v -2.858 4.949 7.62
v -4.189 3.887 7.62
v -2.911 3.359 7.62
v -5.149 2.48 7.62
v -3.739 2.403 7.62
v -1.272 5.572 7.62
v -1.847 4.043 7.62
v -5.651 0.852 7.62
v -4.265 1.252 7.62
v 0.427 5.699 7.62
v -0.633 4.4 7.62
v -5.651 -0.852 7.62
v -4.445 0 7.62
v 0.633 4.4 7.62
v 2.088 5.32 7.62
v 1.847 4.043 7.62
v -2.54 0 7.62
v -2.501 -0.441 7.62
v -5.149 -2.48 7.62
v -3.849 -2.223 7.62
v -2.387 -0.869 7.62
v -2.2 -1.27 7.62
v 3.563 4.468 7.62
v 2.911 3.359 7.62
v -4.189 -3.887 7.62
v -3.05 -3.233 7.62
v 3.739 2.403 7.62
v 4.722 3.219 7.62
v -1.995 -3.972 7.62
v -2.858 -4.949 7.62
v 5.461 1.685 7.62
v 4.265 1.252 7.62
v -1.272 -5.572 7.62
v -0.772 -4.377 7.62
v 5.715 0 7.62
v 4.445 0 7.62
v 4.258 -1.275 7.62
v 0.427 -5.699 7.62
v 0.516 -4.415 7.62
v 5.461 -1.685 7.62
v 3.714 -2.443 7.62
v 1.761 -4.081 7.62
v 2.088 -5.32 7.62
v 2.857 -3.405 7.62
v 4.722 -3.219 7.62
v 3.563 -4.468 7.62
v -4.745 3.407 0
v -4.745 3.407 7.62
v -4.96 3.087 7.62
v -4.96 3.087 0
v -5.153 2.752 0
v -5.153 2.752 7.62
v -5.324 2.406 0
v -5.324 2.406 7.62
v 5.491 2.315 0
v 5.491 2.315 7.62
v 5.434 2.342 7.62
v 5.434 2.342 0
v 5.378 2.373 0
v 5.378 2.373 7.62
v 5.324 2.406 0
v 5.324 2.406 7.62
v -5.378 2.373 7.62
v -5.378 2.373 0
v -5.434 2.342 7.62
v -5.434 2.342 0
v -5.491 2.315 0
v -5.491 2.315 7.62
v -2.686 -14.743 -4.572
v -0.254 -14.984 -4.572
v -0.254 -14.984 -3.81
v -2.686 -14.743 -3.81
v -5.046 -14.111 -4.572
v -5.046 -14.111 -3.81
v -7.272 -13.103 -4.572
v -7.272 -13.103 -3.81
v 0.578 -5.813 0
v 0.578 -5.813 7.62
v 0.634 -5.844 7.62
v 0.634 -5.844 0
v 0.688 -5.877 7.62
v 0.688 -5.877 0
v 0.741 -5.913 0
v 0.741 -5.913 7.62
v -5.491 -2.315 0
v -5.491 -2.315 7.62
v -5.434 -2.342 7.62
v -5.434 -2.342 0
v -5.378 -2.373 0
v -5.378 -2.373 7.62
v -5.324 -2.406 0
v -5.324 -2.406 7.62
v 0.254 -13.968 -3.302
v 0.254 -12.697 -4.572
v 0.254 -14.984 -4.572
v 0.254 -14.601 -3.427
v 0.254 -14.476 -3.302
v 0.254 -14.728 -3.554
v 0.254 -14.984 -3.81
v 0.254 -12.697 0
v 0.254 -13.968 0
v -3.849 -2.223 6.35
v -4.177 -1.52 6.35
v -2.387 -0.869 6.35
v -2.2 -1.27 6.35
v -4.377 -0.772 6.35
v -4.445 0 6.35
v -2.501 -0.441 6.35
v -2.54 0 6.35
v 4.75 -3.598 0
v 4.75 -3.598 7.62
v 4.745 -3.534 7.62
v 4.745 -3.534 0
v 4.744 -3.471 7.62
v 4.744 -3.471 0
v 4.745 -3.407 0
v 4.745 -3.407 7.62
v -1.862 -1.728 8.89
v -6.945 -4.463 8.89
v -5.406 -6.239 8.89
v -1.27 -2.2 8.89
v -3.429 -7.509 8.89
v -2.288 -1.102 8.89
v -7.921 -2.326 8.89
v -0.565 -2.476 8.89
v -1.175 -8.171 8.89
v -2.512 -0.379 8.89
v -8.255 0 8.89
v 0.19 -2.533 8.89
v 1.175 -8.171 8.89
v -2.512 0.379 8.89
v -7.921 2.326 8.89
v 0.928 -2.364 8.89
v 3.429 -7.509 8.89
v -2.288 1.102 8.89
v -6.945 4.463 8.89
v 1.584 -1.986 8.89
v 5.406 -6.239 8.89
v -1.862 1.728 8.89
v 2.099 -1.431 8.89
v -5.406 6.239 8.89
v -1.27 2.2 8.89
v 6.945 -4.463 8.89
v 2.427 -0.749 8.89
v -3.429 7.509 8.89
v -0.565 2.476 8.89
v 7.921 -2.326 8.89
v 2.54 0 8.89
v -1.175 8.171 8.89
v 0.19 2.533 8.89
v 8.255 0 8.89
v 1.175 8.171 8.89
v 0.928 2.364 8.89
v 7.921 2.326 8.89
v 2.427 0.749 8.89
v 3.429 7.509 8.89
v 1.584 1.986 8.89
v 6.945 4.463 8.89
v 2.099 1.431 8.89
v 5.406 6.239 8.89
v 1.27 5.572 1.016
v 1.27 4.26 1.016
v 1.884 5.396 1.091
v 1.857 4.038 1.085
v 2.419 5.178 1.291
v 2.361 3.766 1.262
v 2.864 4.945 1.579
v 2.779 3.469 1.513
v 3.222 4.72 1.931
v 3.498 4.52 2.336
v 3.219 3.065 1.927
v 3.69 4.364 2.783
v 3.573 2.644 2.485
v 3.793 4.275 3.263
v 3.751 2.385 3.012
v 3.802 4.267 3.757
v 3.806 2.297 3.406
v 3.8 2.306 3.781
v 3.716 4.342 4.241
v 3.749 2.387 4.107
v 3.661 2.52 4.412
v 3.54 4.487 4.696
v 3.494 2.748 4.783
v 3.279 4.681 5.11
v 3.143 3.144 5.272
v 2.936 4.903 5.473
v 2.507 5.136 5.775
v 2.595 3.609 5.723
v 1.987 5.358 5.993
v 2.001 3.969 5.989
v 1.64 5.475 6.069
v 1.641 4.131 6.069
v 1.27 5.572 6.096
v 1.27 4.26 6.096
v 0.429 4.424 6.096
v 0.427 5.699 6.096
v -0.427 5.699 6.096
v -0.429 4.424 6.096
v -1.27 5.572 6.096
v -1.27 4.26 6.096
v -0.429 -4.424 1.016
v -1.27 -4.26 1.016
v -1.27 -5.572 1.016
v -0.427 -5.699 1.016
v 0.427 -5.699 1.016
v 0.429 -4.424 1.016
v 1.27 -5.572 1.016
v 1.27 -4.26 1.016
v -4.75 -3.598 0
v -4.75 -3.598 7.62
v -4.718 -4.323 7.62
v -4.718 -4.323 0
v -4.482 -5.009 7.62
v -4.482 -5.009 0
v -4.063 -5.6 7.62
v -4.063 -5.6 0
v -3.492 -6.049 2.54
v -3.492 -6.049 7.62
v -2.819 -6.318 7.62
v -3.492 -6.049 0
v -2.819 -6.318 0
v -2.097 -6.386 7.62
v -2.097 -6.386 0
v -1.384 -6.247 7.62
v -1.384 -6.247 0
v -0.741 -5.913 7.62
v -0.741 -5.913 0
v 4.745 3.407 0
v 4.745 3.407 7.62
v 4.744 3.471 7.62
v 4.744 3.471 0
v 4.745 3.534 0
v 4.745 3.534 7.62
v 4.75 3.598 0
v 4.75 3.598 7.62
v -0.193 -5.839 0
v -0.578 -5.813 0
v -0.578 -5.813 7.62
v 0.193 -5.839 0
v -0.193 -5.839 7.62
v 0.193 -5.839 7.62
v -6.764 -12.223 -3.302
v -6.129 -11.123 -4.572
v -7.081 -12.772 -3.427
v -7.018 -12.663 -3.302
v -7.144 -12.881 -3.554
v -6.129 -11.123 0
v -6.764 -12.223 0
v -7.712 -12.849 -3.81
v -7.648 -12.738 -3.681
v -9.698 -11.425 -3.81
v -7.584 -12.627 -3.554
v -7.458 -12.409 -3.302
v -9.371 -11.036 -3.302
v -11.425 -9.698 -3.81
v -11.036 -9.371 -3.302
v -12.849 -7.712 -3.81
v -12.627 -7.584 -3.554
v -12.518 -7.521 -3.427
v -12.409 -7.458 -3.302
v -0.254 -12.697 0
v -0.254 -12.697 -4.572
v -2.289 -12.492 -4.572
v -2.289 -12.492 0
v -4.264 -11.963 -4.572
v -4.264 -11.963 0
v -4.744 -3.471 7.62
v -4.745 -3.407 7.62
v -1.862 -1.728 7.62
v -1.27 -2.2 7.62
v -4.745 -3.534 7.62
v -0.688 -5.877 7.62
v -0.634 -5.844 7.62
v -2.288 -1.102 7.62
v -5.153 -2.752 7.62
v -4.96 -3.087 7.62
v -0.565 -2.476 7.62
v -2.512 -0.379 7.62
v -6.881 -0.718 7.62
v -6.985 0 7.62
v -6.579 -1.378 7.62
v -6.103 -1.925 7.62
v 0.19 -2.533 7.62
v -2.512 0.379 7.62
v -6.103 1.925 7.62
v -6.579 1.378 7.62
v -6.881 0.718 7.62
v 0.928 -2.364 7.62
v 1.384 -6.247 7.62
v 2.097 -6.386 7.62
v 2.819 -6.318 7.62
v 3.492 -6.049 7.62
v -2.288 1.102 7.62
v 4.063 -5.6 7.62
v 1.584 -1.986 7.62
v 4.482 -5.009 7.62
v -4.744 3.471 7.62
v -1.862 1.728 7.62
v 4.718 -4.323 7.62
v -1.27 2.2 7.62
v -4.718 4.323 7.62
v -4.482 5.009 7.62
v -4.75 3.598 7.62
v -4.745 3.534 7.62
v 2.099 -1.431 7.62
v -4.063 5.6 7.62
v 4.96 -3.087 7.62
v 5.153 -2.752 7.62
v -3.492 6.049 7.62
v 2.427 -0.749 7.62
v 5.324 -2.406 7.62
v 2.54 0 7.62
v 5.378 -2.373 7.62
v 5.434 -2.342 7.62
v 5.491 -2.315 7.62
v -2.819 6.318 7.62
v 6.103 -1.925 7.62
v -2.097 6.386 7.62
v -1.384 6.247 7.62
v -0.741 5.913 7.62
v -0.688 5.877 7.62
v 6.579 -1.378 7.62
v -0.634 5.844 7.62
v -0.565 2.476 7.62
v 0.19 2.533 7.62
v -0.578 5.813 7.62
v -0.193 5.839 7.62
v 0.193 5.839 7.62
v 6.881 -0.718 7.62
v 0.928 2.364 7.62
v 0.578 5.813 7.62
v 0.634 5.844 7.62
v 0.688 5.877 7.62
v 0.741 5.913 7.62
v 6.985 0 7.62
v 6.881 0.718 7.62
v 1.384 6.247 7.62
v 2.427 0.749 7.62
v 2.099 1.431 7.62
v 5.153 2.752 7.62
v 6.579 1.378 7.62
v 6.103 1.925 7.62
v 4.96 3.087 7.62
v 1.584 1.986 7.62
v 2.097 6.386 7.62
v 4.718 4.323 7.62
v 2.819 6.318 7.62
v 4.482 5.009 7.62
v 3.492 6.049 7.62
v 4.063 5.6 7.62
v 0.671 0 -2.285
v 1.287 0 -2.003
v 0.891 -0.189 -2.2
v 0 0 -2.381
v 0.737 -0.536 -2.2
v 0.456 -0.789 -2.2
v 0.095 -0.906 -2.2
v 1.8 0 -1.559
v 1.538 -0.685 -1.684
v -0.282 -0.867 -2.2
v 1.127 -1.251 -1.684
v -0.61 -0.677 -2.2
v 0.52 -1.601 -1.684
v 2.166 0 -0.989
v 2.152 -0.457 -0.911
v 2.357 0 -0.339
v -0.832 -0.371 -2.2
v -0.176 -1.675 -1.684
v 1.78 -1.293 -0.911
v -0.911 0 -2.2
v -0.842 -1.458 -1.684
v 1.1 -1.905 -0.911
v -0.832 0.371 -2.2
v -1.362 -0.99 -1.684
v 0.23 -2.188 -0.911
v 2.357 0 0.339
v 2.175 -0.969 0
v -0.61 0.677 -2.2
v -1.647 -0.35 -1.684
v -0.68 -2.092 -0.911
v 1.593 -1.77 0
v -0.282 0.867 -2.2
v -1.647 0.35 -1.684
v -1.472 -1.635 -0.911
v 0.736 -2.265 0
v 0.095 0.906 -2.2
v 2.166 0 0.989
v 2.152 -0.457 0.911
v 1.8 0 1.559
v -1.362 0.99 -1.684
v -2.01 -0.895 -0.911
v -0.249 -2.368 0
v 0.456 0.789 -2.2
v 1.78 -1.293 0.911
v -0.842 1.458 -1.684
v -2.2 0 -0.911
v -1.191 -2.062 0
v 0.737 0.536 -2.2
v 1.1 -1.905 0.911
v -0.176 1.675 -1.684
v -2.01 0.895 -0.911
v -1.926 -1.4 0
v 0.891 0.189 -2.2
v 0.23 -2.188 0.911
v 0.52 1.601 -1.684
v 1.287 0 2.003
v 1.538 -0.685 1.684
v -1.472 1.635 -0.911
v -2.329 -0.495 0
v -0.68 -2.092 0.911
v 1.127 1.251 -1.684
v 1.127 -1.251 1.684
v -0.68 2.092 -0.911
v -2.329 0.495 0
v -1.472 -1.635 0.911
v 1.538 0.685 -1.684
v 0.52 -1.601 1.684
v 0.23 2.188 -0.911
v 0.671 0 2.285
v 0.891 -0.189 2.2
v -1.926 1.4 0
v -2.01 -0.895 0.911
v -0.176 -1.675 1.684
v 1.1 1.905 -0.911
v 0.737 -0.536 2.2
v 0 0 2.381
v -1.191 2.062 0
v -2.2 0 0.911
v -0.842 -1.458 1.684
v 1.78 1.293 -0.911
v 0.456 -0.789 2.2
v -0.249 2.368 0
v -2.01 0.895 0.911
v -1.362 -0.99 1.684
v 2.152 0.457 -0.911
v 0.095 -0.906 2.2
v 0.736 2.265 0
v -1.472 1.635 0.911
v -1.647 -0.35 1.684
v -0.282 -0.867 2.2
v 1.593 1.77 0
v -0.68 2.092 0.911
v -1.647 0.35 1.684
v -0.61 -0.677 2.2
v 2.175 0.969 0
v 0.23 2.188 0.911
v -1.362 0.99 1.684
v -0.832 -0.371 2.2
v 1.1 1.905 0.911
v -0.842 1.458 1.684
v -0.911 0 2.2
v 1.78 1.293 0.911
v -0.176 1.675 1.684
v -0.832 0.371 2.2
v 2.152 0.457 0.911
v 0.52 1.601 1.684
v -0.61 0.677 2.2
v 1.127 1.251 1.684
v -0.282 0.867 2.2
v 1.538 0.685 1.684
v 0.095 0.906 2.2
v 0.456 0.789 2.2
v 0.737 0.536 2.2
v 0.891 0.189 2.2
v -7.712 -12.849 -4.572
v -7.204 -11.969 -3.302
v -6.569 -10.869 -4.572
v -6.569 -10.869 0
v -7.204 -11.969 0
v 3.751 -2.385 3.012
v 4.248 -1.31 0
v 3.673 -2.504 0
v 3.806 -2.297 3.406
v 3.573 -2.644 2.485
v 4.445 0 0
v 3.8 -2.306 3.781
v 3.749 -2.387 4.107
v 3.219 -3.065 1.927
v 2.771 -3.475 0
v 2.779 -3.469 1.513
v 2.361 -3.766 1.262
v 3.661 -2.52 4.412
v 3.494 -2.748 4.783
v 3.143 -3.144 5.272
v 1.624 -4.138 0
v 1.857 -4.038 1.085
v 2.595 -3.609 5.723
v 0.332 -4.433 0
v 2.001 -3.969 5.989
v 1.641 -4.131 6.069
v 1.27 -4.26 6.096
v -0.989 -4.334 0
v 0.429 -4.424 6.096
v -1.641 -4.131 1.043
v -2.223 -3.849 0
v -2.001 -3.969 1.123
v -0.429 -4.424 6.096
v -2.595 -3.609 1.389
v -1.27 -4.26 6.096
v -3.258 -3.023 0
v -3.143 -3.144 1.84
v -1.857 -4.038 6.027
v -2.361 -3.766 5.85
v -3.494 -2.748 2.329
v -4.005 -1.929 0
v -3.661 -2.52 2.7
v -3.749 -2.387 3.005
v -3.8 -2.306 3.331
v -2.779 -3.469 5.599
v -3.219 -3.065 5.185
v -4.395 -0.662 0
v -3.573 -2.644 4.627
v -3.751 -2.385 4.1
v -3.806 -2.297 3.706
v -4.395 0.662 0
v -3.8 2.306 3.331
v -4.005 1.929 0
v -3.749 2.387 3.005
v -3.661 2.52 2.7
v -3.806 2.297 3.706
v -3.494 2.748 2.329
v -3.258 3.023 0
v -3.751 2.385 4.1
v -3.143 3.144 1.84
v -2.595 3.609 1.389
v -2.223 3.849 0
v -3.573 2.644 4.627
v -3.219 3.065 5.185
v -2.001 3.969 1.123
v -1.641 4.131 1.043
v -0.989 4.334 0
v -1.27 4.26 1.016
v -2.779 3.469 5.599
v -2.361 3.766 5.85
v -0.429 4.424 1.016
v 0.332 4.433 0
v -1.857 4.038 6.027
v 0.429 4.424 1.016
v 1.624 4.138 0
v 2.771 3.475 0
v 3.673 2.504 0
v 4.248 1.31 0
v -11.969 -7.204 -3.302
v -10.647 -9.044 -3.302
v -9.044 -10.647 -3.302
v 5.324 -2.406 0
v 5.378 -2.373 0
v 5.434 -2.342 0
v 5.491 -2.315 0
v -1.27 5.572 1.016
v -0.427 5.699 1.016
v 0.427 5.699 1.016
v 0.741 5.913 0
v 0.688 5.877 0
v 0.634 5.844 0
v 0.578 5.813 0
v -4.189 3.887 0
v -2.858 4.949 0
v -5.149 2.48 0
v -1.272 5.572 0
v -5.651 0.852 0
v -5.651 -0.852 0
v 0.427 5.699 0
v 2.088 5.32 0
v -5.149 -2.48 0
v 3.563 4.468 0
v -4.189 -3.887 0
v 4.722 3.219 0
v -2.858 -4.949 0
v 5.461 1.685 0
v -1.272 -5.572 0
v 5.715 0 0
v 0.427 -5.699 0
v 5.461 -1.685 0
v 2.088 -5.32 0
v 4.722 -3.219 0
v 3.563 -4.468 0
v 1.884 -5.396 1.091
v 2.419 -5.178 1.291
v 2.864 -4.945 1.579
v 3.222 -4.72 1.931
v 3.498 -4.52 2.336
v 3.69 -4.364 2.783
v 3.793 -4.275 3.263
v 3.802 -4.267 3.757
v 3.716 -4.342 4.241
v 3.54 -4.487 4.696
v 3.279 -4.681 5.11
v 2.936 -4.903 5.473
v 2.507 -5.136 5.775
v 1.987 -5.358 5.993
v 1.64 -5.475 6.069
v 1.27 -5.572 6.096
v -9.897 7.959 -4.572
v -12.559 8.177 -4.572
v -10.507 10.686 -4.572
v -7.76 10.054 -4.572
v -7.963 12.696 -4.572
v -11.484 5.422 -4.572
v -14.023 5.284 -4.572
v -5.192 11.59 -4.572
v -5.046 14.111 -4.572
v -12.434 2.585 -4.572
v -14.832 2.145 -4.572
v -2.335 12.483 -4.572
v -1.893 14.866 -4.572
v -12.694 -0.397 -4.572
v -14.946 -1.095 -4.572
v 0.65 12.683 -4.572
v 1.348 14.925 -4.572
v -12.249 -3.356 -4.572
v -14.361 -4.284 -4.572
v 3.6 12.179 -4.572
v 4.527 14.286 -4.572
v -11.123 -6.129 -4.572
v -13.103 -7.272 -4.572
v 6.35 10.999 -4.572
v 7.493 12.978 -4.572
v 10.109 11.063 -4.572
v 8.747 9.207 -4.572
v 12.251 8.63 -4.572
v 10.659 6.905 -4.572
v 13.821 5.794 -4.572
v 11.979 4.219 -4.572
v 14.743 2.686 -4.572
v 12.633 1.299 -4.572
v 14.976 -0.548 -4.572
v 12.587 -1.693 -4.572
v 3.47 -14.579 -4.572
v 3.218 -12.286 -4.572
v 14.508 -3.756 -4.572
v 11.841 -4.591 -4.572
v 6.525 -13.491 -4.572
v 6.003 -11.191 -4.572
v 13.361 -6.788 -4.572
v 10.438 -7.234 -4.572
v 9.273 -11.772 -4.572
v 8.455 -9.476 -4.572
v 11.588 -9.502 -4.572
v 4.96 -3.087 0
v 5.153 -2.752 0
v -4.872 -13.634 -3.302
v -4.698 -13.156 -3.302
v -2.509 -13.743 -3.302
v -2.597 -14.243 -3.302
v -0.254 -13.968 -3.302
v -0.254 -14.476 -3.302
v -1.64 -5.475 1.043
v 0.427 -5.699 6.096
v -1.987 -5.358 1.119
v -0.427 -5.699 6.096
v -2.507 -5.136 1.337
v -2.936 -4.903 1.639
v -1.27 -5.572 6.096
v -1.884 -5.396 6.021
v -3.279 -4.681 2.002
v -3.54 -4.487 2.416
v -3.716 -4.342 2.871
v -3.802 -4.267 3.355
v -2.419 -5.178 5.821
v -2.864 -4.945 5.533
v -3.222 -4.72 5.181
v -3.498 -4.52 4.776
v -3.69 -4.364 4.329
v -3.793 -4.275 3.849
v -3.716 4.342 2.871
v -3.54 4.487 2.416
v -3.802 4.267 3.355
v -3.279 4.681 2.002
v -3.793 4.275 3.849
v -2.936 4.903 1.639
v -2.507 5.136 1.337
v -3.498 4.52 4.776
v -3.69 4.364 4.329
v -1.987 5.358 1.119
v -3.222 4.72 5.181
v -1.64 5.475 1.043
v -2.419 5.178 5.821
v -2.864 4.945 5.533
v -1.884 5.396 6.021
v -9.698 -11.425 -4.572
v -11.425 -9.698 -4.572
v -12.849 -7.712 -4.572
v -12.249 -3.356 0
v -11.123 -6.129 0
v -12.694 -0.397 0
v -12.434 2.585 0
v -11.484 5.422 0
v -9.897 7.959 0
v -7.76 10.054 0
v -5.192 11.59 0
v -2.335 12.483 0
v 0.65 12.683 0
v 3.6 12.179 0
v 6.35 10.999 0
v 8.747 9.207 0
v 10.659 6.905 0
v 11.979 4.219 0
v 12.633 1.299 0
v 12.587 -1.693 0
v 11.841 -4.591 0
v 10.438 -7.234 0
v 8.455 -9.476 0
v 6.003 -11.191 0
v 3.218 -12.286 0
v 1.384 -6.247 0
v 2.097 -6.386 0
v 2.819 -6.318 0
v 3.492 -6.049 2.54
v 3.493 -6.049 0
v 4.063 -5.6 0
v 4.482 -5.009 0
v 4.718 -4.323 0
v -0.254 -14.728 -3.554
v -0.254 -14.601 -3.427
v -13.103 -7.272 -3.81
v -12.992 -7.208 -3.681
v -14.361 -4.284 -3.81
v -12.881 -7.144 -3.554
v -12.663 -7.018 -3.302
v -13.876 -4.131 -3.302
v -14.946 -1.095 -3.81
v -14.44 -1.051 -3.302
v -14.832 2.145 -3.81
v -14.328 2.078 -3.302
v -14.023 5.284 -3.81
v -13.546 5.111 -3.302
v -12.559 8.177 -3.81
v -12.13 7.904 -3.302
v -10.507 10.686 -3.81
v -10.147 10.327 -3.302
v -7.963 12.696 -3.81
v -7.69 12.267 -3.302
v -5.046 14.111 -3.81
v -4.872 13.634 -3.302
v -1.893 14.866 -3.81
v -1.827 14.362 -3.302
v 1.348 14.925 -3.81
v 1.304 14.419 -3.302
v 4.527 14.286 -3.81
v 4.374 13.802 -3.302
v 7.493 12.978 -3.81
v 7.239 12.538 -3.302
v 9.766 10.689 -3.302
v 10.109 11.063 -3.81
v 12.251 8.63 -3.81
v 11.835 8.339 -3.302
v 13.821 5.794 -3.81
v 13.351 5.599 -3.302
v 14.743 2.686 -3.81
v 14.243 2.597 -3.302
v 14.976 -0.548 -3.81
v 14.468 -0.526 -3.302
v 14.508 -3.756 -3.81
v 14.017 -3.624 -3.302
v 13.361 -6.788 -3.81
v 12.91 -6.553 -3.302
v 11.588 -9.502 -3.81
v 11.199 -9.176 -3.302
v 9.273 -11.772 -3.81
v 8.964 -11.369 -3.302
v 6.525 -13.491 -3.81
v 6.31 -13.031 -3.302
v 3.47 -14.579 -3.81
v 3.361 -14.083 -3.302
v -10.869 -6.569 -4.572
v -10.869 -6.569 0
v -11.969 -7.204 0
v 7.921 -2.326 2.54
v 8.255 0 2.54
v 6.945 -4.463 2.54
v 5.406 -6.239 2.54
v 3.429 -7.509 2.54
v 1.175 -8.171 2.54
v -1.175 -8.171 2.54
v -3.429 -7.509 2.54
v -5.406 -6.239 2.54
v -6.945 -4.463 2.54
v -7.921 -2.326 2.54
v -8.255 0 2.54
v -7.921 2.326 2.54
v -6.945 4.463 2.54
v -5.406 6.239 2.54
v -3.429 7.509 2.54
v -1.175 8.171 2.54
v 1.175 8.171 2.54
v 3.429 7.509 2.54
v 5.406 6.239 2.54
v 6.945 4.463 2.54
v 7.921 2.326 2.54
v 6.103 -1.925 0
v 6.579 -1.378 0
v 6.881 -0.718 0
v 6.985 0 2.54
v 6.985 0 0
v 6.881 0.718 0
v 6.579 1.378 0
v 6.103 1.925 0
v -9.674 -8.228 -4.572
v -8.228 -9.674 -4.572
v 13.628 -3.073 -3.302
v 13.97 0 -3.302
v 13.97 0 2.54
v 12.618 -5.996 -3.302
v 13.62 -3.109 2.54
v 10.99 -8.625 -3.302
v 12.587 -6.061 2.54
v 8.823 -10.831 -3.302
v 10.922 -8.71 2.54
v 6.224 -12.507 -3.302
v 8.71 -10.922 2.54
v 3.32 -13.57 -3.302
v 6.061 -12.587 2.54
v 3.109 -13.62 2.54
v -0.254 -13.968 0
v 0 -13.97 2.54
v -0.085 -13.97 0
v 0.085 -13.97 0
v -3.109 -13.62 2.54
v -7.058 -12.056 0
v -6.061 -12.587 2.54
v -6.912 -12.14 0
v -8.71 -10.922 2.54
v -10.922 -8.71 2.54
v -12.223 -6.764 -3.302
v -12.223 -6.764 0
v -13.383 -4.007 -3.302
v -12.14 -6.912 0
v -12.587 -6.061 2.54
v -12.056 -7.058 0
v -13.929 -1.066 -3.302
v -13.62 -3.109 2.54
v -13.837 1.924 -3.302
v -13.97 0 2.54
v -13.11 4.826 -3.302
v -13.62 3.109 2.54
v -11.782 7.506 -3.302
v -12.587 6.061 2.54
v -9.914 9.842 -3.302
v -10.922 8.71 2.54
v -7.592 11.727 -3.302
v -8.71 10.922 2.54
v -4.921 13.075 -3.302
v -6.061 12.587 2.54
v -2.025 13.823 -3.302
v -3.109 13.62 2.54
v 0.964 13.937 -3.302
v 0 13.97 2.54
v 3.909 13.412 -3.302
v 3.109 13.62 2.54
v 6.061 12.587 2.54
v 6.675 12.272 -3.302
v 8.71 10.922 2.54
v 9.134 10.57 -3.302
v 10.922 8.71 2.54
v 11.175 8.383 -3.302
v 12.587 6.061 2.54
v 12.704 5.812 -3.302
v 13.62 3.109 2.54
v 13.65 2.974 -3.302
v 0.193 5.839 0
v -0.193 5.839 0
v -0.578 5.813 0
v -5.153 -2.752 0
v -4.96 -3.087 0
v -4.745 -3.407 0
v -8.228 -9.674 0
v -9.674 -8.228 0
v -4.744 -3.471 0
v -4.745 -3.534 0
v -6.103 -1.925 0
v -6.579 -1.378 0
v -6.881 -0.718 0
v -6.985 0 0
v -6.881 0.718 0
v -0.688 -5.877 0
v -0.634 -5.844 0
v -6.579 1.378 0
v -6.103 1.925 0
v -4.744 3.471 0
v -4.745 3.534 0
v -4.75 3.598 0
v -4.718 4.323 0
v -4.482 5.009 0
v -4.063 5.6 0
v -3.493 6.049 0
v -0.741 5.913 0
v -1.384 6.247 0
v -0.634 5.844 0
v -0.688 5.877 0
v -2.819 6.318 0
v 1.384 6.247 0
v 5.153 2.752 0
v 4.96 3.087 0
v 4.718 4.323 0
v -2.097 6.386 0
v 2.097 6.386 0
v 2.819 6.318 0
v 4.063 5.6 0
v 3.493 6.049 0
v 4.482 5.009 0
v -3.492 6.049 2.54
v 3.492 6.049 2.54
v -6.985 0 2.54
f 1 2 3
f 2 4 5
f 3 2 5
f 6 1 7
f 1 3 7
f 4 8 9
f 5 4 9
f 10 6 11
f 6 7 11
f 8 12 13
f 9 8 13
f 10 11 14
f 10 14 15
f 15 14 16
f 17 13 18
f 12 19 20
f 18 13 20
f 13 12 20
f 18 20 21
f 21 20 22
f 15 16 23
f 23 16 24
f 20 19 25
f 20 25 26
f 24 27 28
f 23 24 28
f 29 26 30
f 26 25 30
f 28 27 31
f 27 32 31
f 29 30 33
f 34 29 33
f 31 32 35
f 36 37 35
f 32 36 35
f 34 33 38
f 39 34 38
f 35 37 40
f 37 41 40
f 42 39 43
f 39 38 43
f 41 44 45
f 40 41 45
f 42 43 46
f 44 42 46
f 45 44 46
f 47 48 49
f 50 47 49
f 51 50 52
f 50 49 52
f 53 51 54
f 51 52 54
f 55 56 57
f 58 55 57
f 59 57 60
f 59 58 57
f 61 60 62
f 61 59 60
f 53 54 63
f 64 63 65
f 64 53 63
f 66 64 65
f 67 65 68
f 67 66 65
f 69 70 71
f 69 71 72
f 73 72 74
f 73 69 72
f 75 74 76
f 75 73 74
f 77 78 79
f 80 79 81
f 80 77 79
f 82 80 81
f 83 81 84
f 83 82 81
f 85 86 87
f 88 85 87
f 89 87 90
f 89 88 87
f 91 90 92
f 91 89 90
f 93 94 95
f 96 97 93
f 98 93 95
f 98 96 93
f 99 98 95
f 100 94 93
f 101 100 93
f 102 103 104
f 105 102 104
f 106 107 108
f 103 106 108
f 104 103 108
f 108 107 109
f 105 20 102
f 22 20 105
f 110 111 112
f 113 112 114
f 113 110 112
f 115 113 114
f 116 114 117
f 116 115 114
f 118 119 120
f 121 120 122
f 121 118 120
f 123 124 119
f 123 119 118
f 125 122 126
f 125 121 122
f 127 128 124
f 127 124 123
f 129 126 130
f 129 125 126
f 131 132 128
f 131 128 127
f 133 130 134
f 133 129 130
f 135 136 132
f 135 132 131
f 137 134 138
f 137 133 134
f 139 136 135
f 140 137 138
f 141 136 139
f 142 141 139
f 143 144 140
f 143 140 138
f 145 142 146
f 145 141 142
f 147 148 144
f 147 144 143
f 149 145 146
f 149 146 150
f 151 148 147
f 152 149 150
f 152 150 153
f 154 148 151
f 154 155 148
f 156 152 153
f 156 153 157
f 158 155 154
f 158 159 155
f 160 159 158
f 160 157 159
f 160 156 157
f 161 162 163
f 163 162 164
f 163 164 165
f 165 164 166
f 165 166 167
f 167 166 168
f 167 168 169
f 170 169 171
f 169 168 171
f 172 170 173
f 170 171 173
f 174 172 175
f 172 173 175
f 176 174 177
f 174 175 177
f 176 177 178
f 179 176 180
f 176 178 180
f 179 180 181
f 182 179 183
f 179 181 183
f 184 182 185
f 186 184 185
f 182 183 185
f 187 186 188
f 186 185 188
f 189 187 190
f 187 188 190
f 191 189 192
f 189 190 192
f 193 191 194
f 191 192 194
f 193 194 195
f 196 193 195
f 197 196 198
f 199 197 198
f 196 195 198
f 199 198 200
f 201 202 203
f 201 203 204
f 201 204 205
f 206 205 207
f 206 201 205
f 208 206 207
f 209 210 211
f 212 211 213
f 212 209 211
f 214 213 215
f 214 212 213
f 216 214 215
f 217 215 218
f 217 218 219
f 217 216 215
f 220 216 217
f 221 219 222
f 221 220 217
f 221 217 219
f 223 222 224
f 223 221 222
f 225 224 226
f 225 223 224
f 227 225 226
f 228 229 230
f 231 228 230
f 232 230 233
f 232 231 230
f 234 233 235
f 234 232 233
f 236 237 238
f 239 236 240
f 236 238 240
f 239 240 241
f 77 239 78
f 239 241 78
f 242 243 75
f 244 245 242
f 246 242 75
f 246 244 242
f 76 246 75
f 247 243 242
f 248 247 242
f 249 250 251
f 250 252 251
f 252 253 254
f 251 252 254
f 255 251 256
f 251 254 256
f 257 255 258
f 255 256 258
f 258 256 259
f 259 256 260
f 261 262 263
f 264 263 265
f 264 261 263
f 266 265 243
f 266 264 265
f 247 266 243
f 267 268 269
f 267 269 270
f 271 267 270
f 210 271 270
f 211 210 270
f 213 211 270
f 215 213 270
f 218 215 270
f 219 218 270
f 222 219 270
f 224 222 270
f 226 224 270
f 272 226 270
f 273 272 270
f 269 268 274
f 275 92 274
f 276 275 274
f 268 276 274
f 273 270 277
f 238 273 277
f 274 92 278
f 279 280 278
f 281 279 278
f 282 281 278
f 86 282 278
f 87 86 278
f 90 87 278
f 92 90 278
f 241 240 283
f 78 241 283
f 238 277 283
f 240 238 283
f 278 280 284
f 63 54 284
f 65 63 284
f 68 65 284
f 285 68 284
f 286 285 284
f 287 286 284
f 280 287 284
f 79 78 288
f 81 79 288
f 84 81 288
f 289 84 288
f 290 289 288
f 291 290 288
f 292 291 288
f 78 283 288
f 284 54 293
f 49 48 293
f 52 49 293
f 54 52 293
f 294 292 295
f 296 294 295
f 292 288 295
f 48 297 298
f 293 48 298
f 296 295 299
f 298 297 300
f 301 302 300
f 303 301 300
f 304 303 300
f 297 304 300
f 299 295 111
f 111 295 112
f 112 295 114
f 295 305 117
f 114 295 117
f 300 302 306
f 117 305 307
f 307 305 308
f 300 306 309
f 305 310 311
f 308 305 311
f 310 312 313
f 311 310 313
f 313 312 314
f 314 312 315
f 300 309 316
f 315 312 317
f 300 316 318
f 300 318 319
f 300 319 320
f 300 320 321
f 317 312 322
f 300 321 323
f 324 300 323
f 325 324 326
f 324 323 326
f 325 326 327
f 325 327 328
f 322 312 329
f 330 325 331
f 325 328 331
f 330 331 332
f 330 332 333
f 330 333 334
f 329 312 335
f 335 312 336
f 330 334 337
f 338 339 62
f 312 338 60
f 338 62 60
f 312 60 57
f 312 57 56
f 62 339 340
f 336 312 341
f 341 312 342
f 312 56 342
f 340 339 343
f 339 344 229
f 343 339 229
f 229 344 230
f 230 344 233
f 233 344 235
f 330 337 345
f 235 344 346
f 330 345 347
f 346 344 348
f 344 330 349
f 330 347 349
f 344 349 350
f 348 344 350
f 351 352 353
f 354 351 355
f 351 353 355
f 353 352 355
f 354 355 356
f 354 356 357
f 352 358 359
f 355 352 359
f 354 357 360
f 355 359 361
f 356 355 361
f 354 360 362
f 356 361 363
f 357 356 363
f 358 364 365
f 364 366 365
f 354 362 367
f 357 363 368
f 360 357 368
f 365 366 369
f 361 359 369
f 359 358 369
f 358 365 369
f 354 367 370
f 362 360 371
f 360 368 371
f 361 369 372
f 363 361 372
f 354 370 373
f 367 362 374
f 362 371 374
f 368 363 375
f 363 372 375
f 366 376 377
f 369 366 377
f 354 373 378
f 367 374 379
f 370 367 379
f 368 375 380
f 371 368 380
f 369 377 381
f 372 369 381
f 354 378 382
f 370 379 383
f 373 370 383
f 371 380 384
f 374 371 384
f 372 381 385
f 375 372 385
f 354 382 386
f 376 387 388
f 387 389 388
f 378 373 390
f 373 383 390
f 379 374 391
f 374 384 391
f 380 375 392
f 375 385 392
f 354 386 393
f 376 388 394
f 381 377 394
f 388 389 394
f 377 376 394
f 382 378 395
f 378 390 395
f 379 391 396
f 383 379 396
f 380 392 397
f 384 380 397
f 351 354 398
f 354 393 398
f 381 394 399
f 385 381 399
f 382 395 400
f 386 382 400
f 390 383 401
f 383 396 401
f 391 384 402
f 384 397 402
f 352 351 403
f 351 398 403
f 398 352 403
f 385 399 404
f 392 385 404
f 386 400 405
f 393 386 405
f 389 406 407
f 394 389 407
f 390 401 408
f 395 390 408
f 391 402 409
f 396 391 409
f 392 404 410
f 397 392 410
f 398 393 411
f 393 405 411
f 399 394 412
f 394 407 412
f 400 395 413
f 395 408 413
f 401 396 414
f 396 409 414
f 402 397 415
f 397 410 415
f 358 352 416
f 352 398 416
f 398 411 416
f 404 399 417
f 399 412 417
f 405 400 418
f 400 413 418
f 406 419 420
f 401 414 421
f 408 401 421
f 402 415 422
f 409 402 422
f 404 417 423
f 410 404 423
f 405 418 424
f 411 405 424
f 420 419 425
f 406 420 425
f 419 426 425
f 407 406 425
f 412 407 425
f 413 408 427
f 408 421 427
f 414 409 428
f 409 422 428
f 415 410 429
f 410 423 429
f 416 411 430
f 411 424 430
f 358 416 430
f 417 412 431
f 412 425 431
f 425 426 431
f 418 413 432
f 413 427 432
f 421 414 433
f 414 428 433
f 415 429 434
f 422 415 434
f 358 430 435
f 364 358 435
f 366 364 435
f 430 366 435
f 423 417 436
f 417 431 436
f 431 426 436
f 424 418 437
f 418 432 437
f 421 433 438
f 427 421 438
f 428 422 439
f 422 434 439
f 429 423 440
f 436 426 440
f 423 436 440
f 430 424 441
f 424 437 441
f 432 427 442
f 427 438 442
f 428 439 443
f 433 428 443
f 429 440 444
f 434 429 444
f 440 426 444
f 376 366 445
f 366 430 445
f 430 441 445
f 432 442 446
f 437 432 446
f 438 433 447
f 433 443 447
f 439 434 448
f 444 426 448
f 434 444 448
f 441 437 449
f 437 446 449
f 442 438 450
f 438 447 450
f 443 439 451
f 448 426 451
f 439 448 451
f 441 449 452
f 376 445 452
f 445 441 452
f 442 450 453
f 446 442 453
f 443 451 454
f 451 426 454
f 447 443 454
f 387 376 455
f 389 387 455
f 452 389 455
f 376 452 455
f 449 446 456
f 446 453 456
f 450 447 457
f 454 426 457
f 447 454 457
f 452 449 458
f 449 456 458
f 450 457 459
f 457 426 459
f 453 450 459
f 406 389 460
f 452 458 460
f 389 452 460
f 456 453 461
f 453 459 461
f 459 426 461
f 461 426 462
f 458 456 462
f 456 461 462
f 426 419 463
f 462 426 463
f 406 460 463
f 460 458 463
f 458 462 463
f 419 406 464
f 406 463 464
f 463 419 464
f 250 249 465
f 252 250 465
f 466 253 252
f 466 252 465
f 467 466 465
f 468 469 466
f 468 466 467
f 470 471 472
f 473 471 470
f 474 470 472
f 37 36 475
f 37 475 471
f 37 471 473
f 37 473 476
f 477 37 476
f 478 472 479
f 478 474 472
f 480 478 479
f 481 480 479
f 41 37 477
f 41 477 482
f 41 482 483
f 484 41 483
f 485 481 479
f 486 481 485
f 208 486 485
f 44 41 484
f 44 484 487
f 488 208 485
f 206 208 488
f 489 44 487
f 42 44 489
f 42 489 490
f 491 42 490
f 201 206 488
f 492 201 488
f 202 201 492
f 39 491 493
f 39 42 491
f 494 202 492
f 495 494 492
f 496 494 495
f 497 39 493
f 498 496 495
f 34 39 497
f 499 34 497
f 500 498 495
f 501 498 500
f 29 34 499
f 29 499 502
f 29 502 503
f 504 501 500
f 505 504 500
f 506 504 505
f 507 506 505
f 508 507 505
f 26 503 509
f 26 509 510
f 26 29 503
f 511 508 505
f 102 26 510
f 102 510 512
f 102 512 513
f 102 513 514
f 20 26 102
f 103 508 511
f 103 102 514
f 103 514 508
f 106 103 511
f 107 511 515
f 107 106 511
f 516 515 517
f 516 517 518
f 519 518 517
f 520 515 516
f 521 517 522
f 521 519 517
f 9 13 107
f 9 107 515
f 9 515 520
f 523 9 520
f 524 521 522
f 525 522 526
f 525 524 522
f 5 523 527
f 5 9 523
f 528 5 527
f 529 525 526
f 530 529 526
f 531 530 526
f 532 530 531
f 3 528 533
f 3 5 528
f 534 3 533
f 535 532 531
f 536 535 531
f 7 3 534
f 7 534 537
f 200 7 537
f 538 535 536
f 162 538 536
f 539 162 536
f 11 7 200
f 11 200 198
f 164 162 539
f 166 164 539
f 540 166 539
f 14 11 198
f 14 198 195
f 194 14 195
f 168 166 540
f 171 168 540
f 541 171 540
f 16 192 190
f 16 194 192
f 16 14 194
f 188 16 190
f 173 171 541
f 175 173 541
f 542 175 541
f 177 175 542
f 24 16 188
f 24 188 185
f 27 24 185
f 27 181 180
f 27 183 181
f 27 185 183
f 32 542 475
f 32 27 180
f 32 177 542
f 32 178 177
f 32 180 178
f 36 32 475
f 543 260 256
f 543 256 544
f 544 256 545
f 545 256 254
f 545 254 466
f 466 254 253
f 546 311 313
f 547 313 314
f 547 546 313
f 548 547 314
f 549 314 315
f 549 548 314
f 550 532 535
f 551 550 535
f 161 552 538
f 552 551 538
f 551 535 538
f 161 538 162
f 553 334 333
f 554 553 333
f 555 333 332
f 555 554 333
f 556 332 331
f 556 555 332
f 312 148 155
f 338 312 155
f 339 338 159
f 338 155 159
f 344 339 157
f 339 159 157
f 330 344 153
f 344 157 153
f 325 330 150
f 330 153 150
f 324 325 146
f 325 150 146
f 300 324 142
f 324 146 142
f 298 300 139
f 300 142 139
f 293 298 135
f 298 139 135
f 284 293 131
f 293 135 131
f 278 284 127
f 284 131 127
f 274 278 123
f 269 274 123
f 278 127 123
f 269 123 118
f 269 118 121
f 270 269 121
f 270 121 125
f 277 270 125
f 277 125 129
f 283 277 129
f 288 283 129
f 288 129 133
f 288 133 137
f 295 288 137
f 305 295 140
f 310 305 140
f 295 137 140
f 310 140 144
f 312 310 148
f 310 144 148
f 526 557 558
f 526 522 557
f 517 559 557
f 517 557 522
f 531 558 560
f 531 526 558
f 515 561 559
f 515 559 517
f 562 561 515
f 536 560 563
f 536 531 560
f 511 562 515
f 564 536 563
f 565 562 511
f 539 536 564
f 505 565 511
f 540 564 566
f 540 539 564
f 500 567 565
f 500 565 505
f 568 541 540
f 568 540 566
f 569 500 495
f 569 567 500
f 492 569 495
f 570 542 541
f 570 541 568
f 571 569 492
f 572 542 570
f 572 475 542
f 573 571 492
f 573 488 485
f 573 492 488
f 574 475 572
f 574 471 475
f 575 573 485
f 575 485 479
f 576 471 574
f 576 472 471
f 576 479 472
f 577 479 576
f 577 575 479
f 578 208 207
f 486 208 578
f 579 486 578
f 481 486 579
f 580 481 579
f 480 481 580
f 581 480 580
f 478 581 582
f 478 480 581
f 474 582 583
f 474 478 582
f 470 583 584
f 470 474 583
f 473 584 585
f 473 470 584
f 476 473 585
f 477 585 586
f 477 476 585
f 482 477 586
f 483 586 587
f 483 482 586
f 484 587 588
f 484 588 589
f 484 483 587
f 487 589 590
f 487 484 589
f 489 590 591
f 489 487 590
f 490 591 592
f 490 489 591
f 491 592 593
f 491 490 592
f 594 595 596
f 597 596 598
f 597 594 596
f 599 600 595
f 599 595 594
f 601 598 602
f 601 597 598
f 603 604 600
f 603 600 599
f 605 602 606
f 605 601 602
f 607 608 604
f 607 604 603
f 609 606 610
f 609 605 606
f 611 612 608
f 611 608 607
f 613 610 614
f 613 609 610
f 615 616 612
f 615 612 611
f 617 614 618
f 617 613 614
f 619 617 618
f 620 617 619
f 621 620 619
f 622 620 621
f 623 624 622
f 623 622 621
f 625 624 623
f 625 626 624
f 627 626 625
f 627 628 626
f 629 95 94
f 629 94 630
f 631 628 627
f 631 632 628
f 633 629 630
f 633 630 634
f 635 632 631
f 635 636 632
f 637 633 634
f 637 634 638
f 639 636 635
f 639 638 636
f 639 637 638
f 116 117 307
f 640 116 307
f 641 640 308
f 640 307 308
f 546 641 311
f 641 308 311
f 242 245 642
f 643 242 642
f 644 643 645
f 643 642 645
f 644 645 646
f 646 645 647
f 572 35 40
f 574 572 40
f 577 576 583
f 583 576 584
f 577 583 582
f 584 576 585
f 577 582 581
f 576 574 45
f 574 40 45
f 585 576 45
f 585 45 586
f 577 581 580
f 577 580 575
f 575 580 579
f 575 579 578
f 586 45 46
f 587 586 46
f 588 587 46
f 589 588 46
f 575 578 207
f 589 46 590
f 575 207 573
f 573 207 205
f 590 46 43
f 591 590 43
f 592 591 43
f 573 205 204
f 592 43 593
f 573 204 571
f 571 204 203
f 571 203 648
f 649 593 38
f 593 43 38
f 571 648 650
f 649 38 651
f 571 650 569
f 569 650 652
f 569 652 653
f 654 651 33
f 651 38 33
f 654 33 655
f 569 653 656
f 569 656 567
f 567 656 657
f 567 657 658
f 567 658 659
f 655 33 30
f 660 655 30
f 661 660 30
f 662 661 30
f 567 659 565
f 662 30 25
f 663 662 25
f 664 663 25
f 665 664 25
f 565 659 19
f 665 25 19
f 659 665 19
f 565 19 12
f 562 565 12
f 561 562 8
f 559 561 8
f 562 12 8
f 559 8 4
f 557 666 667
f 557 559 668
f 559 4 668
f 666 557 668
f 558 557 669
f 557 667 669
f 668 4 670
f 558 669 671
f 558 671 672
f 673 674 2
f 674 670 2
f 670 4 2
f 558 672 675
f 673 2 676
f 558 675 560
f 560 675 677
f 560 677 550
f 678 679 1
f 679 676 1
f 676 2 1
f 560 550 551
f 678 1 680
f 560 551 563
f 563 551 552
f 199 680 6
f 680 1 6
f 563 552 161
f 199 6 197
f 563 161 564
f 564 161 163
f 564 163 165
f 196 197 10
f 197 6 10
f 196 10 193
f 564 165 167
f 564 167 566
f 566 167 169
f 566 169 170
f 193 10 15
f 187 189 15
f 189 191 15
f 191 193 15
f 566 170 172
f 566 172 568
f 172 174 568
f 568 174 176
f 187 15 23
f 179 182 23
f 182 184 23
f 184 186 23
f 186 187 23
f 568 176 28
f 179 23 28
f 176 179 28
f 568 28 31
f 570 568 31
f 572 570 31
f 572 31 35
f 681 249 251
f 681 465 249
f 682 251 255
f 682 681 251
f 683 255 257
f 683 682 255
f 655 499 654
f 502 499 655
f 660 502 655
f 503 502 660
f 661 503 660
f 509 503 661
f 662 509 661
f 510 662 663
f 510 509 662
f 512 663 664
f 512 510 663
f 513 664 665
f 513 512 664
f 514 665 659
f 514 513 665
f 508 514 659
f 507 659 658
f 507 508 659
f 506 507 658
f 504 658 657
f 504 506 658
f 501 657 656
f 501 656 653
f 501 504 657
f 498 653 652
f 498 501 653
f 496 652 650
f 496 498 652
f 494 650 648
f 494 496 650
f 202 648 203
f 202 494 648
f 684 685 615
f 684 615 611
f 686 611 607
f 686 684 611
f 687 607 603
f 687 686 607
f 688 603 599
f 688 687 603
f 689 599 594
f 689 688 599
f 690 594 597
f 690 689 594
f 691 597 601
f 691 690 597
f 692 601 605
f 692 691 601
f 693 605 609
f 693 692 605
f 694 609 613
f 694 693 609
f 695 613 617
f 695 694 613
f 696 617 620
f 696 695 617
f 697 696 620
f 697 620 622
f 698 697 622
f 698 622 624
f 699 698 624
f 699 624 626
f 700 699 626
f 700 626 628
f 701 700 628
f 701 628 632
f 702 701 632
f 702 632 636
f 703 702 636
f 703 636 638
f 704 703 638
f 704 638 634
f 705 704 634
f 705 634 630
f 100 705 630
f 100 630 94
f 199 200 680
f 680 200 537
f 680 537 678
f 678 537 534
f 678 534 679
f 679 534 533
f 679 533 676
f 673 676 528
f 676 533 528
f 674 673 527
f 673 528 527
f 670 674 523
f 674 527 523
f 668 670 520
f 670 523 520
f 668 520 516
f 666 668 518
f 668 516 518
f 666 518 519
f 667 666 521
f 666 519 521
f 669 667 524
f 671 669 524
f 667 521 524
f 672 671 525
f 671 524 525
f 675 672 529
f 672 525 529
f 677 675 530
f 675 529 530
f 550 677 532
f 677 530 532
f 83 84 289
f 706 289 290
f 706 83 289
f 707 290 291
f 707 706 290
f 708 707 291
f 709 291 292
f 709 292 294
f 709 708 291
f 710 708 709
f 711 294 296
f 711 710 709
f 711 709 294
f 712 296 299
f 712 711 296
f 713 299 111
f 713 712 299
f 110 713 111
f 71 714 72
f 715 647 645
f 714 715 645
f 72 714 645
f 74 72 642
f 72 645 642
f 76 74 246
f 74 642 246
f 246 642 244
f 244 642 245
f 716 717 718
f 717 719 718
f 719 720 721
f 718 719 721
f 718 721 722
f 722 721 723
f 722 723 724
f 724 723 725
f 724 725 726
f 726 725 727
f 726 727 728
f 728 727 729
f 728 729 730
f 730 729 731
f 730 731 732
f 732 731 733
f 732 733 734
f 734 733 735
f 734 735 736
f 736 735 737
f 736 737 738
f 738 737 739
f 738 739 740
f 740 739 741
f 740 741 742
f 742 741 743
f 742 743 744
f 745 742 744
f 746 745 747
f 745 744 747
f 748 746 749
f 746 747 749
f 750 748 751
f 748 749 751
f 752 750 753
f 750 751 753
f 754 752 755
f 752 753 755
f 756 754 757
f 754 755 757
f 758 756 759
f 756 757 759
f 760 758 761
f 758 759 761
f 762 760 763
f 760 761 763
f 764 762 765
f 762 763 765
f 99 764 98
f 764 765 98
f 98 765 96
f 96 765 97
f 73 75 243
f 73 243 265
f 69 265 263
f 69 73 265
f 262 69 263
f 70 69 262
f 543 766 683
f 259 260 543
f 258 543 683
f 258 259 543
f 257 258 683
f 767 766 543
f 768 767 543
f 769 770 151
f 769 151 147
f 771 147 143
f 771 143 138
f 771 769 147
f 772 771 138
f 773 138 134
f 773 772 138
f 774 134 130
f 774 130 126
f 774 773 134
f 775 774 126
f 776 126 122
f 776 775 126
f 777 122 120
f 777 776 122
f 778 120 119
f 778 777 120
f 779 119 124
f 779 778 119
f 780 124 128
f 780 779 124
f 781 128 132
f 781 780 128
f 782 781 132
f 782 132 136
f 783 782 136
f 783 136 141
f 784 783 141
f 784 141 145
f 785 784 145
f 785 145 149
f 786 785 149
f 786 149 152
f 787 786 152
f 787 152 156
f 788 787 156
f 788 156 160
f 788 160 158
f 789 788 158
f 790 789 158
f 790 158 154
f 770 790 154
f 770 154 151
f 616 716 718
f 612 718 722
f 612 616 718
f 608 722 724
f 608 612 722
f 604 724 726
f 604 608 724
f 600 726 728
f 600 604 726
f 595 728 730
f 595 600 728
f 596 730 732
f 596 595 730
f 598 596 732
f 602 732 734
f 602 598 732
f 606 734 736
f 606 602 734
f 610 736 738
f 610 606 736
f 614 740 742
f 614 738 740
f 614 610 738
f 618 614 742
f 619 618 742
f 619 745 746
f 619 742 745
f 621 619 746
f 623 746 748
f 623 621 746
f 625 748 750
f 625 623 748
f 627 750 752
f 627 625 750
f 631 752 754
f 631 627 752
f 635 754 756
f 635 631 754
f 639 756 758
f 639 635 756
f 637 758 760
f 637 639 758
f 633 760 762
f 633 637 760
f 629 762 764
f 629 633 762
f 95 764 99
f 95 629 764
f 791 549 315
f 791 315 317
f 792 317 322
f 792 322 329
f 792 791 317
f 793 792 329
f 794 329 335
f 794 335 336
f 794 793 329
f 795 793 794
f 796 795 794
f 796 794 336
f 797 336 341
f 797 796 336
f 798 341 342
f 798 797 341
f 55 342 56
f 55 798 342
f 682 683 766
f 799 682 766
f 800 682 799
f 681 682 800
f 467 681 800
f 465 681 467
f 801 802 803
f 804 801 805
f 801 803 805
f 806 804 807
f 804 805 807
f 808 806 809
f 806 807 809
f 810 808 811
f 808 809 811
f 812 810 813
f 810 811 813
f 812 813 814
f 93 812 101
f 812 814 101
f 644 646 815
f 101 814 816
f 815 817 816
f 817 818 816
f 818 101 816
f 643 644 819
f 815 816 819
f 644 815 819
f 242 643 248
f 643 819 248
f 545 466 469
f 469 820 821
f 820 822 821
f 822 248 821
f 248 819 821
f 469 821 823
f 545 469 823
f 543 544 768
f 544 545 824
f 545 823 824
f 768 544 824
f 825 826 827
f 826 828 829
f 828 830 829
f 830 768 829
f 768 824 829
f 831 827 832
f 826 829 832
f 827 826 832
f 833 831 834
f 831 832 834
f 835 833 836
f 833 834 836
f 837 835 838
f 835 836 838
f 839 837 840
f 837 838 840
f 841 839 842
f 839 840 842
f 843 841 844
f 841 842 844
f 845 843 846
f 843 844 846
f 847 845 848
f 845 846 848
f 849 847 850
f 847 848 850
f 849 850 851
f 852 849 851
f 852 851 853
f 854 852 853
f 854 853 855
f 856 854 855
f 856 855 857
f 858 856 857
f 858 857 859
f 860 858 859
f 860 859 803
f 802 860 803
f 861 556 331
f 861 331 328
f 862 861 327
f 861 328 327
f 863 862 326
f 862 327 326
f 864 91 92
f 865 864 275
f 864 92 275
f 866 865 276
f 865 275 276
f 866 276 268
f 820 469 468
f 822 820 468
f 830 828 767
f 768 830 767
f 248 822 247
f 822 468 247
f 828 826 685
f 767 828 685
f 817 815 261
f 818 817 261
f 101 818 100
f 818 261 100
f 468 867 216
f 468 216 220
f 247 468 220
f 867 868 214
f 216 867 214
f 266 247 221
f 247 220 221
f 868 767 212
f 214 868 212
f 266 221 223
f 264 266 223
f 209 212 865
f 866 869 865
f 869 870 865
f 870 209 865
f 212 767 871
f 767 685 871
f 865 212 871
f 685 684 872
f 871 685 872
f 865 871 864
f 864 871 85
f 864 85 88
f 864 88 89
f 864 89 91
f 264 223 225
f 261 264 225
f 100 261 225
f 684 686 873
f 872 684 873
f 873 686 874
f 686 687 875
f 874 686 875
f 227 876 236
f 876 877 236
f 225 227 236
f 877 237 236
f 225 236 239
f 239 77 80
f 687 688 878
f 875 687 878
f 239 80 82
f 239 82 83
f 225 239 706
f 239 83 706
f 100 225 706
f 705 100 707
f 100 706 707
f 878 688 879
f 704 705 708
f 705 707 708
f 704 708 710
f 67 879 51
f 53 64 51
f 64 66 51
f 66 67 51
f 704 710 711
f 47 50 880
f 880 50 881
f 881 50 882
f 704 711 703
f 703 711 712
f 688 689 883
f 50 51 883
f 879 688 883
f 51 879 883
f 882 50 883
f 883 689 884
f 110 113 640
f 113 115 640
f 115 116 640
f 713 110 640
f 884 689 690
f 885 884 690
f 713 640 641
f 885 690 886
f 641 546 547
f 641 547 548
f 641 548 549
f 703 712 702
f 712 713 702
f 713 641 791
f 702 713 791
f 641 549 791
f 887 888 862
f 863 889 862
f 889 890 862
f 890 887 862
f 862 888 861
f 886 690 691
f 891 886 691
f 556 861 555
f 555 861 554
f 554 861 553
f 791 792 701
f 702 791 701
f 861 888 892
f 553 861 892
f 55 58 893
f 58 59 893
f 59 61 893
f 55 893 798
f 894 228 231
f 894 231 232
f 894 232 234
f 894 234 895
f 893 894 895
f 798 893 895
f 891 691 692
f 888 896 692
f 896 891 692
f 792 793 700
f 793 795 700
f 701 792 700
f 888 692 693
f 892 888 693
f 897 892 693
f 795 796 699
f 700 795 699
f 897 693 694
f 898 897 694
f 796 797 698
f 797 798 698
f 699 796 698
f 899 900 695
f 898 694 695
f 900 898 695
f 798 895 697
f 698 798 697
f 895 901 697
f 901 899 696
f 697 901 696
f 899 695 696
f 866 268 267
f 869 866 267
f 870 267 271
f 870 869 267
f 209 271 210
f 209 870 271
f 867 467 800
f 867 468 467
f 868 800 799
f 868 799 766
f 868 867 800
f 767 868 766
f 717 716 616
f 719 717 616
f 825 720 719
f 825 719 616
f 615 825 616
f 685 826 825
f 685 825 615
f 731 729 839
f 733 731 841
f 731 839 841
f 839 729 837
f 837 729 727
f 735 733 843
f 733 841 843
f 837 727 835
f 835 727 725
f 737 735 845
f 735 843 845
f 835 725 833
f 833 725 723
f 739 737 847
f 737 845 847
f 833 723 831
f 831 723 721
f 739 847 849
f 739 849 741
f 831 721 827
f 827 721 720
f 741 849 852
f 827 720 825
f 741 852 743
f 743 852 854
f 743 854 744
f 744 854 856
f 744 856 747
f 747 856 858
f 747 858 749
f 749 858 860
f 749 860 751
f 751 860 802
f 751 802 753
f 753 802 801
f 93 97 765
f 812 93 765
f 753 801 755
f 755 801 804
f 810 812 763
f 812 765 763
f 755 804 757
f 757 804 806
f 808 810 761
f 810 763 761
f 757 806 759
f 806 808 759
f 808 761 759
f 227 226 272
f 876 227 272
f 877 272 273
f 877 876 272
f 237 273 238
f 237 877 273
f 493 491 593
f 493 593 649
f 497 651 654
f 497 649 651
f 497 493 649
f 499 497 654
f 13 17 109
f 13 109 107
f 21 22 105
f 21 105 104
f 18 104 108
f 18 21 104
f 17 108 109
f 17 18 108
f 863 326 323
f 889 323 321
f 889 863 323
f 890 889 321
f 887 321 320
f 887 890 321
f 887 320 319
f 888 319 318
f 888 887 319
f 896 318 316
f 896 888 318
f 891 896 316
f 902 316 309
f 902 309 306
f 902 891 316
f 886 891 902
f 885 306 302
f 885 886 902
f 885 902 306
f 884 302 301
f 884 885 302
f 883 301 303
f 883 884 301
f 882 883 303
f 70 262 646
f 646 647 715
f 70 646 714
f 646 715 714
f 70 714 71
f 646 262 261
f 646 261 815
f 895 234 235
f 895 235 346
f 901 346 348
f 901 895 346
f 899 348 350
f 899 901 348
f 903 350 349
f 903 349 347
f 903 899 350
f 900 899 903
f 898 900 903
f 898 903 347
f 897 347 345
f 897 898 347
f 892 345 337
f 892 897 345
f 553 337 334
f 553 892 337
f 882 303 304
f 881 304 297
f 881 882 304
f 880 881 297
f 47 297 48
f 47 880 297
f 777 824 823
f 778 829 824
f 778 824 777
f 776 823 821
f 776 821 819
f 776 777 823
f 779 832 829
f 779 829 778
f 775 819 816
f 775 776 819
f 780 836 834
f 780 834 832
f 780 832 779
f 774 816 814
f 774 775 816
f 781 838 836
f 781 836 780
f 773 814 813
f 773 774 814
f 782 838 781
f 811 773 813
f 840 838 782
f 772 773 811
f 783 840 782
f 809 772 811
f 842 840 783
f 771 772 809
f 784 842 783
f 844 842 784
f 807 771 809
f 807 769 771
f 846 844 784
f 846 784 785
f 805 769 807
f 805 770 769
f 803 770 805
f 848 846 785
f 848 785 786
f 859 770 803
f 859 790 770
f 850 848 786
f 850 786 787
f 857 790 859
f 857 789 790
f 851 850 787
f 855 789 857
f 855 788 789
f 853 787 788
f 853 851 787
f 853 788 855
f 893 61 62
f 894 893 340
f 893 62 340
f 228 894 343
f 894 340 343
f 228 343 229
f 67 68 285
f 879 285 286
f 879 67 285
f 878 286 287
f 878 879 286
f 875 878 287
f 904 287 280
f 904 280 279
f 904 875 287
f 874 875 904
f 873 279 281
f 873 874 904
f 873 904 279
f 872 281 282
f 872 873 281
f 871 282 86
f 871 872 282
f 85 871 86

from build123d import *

# Parameters (mm, degrees)
F0_R           = 13.97
F1_DEPTH       = 2.54
F2_R           = 13.97
F2_R_2         = 12.7
F3_DEPTH       = 4.572
F4_R           = 14.986
F4_R_2         = 12.7
F5_DEPTH       = 1.27
F6_SIZE        = 0.508
F8_R           = 6.985
F9_DEPTH       = 7.113
F11_R          = 8.255
F12_DEPTH      = 8.89
F13_R          = 5.842
F14_DEPTH      = 13.463
F15_R          = 2.54
F16_DEPTH      = 1.27
F17_R          = 5.715
F17_R_2        = 4.445
F18_DEPTH      = 7.62
F20_DEPTH      = 14.987
F20_DEPTH_BACK = 14.987
F24_DEPTH      = 1.27
F7_W           = 0.508
F7_H           = 12.703388625
F25_DEPTH      = 4.573


with BuildPart() as f1:
    # F0 (on Top) → F1 (new body)
    with BuildSketch(Plane.XY):
        Circle(F0_R)
    extrude(amount=F1_DEPTH)

    # F2 (on face) → F3 (join)
    with BuildSketch(Plane(origin=(0, 0, 0), x_dir=(1, 0, 0), z_dir=(0, 0, -1))):
        Circle(F2_R)
        Circle(F2_R_2, mode=Mode.SUBTRACT)
    extrude(amount=F3_DEPTH)

    # F4 (on face) → F5 (join)
    with BuildSketch(Plane(origin=(0, 0, -4.572), x_dir=(1, 0, 0), z_dir=(0, 0, -1))):
        Circle(F4_R)
        Circle(F4_R_2, mode=Mode.SUBTRACT)
    extrude(amount=-F5_DEPTH)

    # F6
    f6_edges = [f1.edges().sort_by_distance(p)[0] for p in [
        (-14.986, 0, -3.302),
    ]]
    chamfer(f6_edges, length=F6_SIZE)

    # F8 (on face) → F9 (cut, through all)
    with BuildSketch(Plane.XY.offset(2.54)):
        Circle(F8_R)
    extrude(amount=-F9_DEPTH, mode=Mode.SUBTRACT)

    # F11 (on face) → F12 (join)
    with BuildSketch(Plane(origin=(0, 0, 0), x_dir=(1, 0, 0), z_dir=(0, 0, -1))):
        Circle(F11_R)
        with BuildLine():
            ThreePointArc((-5.4908389692, -2.3146967081), (-6.985, 0), (-5.4908389692, 2.3146967081))
            ThreePointArc((-5.4908389692, 2.3146967081), (-4.913906191, 2.8370450621), (-4.7500056359, 3.5978576814))
            ThreePointArc((-4.7500056359, 3.5978576814), (-3.4925, 6.0491874454), (-0.7408333333, 5.9125543895))
            ThreePointArc((-0.7408333333, 5.9125543895), (0, 5.6740901243), (0.7408333333, 5.9125543895))
            ThreePointArc((0.7408333333, 5.9125543895), (3.4925, 6.0491874454), (4.7500056359, 3.5978576814))
            ThreePointArc((4.7500056359, 3.5978576814), (4.913906191, 2.8370450621), (5.4908389692, 2.3146967081))
            ThreePointArc((5.4908389692, 2.3146967081), (6.985, 0), (5.4908389692, -2.3146967081))
            ThreePointArc((5.4908389692, -2.3146967081), (4.913906191, -2.8370450621), (4.7500056359, -3.5978576814))
            ThreePointArc((4.7500056359, -3.5978576814), (3.4925, -6.0491874454), (0.7408333333, -5.9125543895))
            ThreePointArc((0.7408333333, -5.9125543895), (0, -5.6740901243), (-0.7408333333, -5.9125543895))
            ThreePointArc((-0.7408333333, -5.9125543895), (-3.4925, -6.0491874454), (-4.7500056359, -3.5978576814))
            ThreePointArc((-4.7500056359, -3.5978576814), (-4.913906191, -2.8370450621), (-5.4908389692, -2.3146967081))
        make_face(mode=Mode.SUBTRACT)
    extrude(amount=-F12_DEPTH)

    # F13 (on face) → F14 (cut, through all)
    with BuildSketch(Plane.XY.offset(8.89)):
        Circle(F13_R)
    extrude(amount=-F14_DEPTH, mode=Mode.SUBTRACT)

    # F15 (on face) → F16 (join)
    with BuildSketch(Plane.XY.offset(8.89)):
        with BuildLine():
            ThreePointArc((0.5781535044, -5.813321127), (0.6613572254, -5.8598822935), (0.7408333333, -5.9125543895))
            ThreePointArc((0.7408333333, -5.9125543895), (3.4925, -6.0491874454), (4.7500056359, -3.5978576814))
            ThreePointArc((4.7500056359, -3.5978576814), (4.7441283166, -3.502693305), (4.7454070241, -3.4073561856))
            ThreePointArc((4.7454070241, -3.4073561856), (5.0593204089, -2.921), (5.3235605285, -2.4059649414))
            ThreePointArc((5.3235605285, -2.4059649414), (5.4054855421, -2.3571889885), (5.4908389692, -2.3146967081))
            ThreePointArc((5.4908389692, -2.3146967081), (6.985, 0), (5.4908389692, 2.3146967081))
            ThreePointArc((5.4908389692, 2.3146967081), (5.4054855421, 2.3571889885), (5.3235605285, 2.4059649414))
            ThreePointArc((5.3235605285, 2.4059649414), (5.0593204089, 2.921), (4.7454070241, 3.4073561856))
            ThreePointArc((4.7454070241, 3.4073561856), (4.7441283166, 3.502693305), (4.7500056359, 3.5978576814))
            ThreePointArc((4.7500056359, 3.5978576814), (3.4925, 6.0491874454), (0.7408333333, 5.9125543895))
            ThreePointArc((0.7408333333, 5.9125543895), (0.6613572254, 5.8598822935), (0.5781535044, 5.813321127))
            ThreePointArc((0.5781535044, 5.813321127), (0, 5.842), (-0.5781535044, 5.813321127))
            ThreePointArc((-0.5781535044, 5.813321127), (-0.6613572254, 5.8598822935), (-0.7408333333, 5.9125543895))
            ThreePointArc((-0.7408333333, 5.9125543895), (-3.4925, 6.0491874454), (-4.7500056359, 3.5978576814))
            ThreePointArc((-4.7500056359, 3.5978576814), (-4.7441283166, 3.502693305), (-4.7454070241, 3.4073561856))
            ThreePointArc((-4.7454070241, 3.4073561856), (-5.0593204089, 2.921), (-5.3235605285, 2.4059649414))
            ThreePointArc((-5.3235605285, 2.4059649414), (-5.4054855421, 2.3571889885), (-5.4908389692, 2.3146967081))
            ThreePointArc((-5.4908389692, 2.3146967081), (-6.985, 0), (-5.4908389692, -2.3146967081))
            ThreePointArc((-5.4908389692, -2.3146967081), (-5.4054855421, -2.3571889885), (-5.3235605285, -2.4059649414))
            ThreePointArc((-5.3235605285, -2.4059649414), (-5.0593204089, -2.921), (-4.7454070241, -3.4073561856))
            ThreePointArc((-4.7454070241, -3.4073561856), (-4.7441283166, -3.502693305), (-4.7500056359, -3.5978576814))
            ThreePointArc((-4.7500056359, -3.5978576814), (-3.4925, -6.0491874454), (-0.7408333333, -5.9125543895))
            ThreePointArc((-0.7408333333, -5.9125543895), (-0.6613572254, -5.8598822935), (-0.5781535044, -5.813321127))
            ThreePointArc((-0.5781535044, -5.813321127), (0, -5.842), (0.5781535044, -5.813321127))
        make_face()
        Circle(F15_R, mode=Mode.SUBTRACT)
    extrude(amount=-F16_DEPTH)

    # F7 (on face) → F25 (cut, through all)
    with BuildSketch(Plane(origin=(0, 0, 0), x_dir=(1, 0, 0), z_dir=(0, 0, -1))):
        with Locations((0, 12.6966122789)):
            Rectangle(F7_W, F7_H)
        Polygon((-5.6218601438, 2.9524885306), (-5.3678601438, 3.3924294357), (-16.3693174072, 9.7441237483), (-16.6233174072, 9.3041828431), align=None)
        Polygon((-9.3041828431, 16.6233174072), (-9.7441237483, 16.3693174072), (-3.3924294357, 5.3678601438), (-2.9524885306, 5.6218601438), align=None)
    extrude(amount=F25_DEPTH, mode=Mode.SUBTRACT)


with BuildPart() as f18:
    # F17 (on face) → F18 (new body)
    with BuildSketch(Plane(origin=(0, 0, 7.62), x_dir=(1, 0, 0), z_dir=(0, 0, -1))):
        Circle(F17_R)
        Circle(F17_R_2, mode=Mode.SUBTRACT)
    extrude(amount=F18_DEPTH)

    # F19 (on Front) → F20 (cut, two sides)
    with BuildSketch(Plane.XZ) as f20_sk:
        with BuildLine():
            Line((-1.27, 1.016), (1.27, 1.016))
            ThreePointArc((1.27, 1.016), (3.81, 3.556), (1.27, 6.096))
            Line((1.27, 6.096), (-1.27, 6.096))
            ThreePointArc((-1.27, 6.096), (-3.81, 3.556), (-1.27, 1.016))
        make_face()
    extrude(amount=-F20_DEPTH, mode=Mode.SUBTRACT)
    extrude(f20_sk.sketch, amount=F20_DEPTH_BACK, mode=Mode.SUBTRACT)

    # F23 (on face) → F24 (join)
    with BuildSketch(Plane.XY.offset(7.62)):
        with BuildLine():
            Line((-2.54, 0), (-4.445, 0))
            ThreePointArc((-4.445, 0), (-4.2935402979, -1.1504506555), (-3.8494829198, -2.2225))
            Line((-3.8494829198, -2.2225), (-2.1997045256, -1.27))
            ThreePointArc((-2.1997045256, -1.27), (-2.4534515988, -0.6574003746), (-2.54, 0))
        make_face()
    extrude(amount=-F24_DEPTH)


with BuildPart() as f22:
    # F21 (on Front) → F22 (revolve)
    with BuildSketch(Plane.XZ):
        with BuildLine():
            Line((0, 2.38125), (0, -2.38125))
            ThreePointArc((0, -2.38125), (2.38125, 0), (0, 2.38125))
        make_face()
    revolve(axis=Axis((0, 0, 0), (0, 0, -1)))


solid = Compound([f1.part, f18.part, f22.part])
